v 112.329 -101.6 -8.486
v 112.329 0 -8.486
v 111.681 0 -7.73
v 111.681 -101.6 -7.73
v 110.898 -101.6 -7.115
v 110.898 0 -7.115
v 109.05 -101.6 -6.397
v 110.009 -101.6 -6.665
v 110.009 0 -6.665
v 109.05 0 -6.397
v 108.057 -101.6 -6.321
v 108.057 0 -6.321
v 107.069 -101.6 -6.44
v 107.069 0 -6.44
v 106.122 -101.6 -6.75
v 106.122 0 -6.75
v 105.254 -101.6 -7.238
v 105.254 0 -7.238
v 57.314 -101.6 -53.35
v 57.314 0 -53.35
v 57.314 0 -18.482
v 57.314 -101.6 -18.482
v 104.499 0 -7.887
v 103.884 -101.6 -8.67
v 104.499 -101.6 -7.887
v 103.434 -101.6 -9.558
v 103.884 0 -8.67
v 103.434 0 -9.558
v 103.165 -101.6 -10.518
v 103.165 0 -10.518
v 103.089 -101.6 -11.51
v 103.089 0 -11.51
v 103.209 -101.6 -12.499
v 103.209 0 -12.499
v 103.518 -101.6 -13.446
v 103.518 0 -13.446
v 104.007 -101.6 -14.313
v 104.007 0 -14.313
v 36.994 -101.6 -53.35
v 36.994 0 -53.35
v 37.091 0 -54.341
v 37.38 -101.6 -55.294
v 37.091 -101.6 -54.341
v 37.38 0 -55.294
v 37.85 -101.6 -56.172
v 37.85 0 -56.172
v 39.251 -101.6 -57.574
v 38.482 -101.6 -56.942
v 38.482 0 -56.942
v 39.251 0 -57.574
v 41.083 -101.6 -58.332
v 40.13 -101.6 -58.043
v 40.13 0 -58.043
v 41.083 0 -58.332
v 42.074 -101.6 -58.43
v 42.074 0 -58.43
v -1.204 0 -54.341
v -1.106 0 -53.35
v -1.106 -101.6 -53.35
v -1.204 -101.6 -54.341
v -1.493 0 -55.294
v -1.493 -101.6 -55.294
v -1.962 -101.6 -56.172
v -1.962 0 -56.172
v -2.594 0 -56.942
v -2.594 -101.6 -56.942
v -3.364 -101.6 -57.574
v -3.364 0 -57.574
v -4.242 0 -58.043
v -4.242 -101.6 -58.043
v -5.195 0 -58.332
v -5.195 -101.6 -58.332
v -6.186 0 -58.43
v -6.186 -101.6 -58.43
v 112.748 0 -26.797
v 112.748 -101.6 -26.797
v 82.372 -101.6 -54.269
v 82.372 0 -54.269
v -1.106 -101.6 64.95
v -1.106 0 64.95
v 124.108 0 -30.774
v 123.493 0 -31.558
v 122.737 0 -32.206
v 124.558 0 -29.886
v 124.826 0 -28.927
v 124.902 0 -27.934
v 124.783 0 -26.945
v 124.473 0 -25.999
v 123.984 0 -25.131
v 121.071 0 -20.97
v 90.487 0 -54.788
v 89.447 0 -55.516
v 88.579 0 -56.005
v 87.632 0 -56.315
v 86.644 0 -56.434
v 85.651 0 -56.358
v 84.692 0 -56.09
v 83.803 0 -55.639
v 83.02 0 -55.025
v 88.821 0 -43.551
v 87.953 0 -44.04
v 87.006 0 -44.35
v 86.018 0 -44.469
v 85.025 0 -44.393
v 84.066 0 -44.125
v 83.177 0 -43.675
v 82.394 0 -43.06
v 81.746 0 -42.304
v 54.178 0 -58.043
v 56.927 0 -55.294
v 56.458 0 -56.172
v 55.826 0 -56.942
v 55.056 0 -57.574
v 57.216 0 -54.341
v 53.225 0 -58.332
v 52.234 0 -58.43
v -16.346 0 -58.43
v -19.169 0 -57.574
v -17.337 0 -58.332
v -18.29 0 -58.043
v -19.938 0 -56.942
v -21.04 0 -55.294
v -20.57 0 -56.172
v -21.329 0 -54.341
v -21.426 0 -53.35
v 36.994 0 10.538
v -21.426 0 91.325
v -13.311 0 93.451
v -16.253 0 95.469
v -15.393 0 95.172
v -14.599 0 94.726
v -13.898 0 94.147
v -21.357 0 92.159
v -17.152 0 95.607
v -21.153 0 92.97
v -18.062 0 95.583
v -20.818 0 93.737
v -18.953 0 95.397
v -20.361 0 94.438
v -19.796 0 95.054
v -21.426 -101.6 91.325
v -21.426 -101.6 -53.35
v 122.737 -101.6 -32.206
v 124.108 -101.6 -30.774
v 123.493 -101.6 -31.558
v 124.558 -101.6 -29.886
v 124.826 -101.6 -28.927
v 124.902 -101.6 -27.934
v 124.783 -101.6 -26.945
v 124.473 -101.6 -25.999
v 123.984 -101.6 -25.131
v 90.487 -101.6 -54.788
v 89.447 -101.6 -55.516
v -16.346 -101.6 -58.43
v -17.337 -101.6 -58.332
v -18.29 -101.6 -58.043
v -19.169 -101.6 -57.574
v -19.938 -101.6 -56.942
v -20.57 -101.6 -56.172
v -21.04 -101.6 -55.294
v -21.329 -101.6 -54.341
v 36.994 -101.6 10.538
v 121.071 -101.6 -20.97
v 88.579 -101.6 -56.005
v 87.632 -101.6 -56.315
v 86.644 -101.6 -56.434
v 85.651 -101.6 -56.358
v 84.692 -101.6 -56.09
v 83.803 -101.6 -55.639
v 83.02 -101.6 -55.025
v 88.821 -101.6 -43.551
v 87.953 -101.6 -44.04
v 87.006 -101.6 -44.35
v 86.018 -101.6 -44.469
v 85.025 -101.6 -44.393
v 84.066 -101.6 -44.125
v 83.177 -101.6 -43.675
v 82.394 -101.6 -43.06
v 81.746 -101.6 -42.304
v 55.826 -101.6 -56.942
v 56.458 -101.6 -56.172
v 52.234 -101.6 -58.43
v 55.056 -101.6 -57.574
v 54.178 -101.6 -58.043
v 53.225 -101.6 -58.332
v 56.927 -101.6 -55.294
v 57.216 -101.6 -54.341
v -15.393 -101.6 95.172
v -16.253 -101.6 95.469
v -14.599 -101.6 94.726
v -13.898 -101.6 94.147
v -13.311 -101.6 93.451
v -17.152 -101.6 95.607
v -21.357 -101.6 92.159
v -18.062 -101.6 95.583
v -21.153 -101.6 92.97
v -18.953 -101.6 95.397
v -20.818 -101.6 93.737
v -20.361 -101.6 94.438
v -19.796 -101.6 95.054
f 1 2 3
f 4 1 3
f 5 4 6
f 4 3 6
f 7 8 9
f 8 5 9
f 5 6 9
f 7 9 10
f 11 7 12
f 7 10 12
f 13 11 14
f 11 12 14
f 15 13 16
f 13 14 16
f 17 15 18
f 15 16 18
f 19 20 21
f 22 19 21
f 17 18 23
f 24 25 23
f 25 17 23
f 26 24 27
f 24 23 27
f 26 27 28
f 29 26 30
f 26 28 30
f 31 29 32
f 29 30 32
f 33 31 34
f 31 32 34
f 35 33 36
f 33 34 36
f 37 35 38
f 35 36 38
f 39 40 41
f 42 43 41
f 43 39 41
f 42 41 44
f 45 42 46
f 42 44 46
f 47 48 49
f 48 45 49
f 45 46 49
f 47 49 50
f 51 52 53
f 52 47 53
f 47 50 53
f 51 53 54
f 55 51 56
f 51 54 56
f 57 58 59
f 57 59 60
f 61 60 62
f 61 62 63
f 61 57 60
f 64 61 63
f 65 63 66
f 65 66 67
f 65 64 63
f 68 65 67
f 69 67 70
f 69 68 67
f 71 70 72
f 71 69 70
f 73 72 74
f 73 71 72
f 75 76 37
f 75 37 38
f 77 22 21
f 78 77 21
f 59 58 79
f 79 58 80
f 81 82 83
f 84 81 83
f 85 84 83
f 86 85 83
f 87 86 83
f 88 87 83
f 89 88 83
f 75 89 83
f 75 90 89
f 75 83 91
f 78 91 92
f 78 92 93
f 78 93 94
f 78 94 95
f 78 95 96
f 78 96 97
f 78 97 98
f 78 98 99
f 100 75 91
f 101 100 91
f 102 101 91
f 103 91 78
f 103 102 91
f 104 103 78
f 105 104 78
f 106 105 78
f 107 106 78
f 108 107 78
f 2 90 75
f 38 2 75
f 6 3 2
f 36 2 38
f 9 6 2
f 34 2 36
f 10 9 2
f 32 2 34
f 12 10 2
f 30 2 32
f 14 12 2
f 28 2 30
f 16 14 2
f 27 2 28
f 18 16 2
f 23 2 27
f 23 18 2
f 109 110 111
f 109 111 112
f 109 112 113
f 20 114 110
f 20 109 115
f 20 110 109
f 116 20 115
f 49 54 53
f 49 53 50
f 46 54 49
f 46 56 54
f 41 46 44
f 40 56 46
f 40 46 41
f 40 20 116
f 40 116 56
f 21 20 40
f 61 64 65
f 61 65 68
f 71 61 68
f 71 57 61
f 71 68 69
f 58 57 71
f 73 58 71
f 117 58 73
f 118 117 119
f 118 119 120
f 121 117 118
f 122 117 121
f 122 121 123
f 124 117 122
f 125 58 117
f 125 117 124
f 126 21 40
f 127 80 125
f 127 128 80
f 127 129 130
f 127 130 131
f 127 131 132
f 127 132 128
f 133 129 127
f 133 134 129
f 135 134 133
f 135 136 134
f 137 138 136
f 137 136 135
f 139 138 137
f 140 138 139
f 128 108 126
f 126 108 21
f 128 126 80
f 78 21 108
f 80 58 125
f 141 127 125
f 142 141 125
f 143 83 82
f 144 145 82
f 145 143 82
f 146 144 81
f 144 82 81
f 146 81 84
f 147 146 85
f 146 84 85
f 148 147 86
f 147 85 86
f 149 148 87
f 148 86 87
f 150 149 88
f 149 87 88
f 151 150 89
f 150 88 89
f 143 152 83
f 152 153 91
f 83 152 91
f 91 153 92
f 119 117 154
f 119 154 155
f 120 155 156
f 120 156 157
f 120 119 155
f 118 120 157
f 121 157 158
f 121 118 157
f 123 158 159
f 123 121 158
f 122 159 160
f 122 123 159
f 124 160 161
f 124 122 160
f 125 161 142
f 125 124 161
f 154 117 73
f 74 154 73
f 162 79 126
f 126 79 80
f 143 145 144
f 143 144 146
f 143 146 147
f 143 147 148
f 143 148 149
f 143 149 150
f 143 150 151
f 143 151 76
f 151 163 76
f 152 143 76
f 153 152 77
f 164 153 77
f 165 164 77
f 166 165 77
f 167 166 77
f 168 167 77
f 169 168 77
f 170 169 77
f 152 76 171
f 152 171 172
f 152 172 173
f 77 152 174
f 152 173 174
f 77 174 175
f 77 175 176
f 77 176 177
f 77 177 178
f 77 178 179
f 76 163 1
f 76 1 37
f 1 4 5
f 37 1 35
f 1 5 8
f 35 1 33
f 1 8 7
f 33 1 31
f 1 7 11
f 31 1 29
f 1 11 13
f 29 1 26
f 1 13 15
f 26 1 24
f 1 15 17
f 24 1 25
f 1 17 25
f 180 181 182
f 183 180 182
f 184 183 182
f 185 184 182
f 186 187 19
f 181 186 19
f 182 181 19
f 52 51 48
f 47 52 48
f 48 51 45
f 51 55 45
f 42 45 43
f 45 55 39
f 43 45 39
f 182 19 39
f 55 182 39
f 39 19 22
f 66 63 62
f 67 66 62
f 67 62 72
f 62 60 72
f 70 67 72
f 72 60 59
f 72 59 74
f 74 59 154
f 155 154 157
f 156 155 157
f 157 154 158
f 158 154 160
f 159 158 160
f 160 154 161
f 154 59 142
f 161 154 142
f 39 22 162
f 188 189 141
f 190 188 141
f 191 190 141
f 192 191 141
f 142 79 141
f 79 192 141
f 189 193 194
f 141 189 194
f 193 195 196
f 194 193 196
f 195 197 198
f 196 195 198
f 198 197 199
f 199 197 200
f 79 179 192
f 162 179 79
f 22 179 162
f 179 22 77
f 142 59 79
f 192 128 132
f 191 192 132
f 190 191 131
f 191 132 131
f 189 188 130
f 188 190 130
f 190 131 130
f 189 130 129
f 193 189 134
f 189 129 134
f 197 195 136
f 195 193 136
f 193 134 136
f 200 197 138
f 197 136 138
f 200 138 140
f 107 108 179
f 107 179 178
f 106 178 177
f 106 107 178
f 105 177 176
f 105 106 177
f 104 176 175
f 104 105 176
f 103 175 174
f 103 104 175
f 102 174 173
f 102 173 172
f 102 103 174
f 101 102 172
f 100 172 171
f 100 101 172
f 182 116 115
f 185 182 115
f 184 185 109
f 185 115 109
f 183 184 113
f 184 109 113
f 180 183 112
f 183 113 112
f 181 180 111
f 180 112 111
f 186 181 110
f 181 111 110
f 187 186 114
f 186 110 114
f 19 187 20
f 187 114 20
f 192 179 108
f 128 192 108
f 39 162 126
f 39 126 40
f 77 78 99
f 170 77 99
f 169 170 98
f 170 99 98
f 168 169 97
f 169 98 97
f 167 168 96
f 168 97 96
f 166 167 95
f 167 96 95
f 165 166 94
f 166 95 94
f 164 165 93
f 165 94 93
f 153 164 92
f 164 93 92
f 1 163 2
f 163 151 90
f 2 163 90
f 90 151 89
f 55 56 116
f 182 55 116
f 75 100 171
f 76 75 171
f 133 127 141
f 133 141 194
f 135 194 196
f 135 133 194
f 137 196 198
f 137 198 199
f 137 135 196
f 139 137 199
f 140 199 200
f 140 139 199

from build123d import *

# Parameters (mm, degrees)
F1_DEPTH    = 101.6
F3_DEPTH    = 6.35
F5_DEPTH    = 44.45
F6_W        = 10.16
F6_H        = 101.6
F7_DEPTH    = 20.32
F8_T1_DEPTH = 101.6
F8_T3_DEPTH = 127
F8_T5_DEPTH = 114.822403084
F10_W       = 251.0453239083
F10_H       = 203.9344906807
F11_DEPTH   = 160.782


# Not quite as in the source:
# - a fillet or chamfer that OpenCascade refuses, or shapes differently, is made with other operations: its cross-section is extruded or revolved along the edge and cut away or added


with BuildPart() as f1:
    # F0 (on Front) → F1 (new body)
    with BuildSketch(Plane.XZ):
        Polygon((57.3137016242, -18.4824153282), (36.9937016242, 10.5375521688), (36.9937016242, -58.4300412773), (57.3137016242, -58.4300412773), align=None)
    extrude(amount=F1_DEPTH)



with BuildPart() as f1b:
    # F0 (on Front) → F1, piece 2 (new body)
    with BuildSketch(Plane.XZ):
        Polygon((-1.1062983758, 64.9499912257), (-21.4262983758, 93.9699587227), (-21.4262983758, -58.4300412773), (-1.1062983758, -58.4300412773), align=None)
    extrude(amount=F1_DEPTH)


with BuildPart() as f1_1:
    add(f1.part)

    add(f1b.part)  # F3 merges F1b
    # F2 (on face) → F3 (join)
    with BuildSketch(Plane(origin=(29.774176385, 0, 20.8481027487), x_dir=(0, 1, 0), z_dir=(0.8191520443, 0, 0.5735764364))):
        Polygon((-101.6, 89.265303656), (-101.6, -96.780755544), (0, -96.780755544), (0, 38.465303656), (0, 89.265303656), align=None)
    extrude(amount=F3_DEPTH)

    # F4 (on face) → F5 (join)
    with BuildSketch(Plane(origin=(34.9757918662, 0, 24.4903131196), x_dir=(0, 1, 0), z_dir=(0.8191520443, 0, 0.5735764364))):
        Polygon((-101.6, -86.620755544), (-101.6, -96.780755544), (0, -96.780755544), (0, -86.620755544), (-12.7, -86.620755544), (-88.9, -86.620755544), align=None)
    extrude(amount=F5_DEPTH)

    # F6 (on face) → F7 (join)
    with BuildSketch(Plane(origin=(49.6836242789, 0, -70.9555689817), x_dir=(0.8191520443, 0, 0.5735764364), z_dir=(-0.5735764364, 0, 0.8191520443))):
        with Locations((82.0675579321, -50.8)):
            Rectangle(F6_W, F6_H)
    extrude(amount=F7_DEPTH)

    # F8: fillet of radius 5.08 on 11 edges, made by hand

    # F8_s2 → F8_t1 (join)
    with BuildSketch(Plane.XZ):
        with BuildLine():
            ThreePointArc((81.7456478485, -42.3039634771), (85.0248074909, -44.3930185658), (88.8207085301, -43.5514875655))
            Line((88.8207085301, -43.5514875655), (84.6594161452, -46.4652558621))
            Line((84.6594161452, -46.4652558621), (81.7456478485, -42.3039634771))
        make_face()
    extrude(amount=F8_T1_DEPTH)

    # F8_s4 → F8_t3 (cut)
    with BuildSketch(Plane.XZ.offset(-12.7)):
        with BuildLine():
            ThreePointArc((112.3294196238, -8.4859061114), (109.0502599814, -6.3968510227), (105.2543589422, -7.238382023))
            Line((105.2543589422, -7.238382023), (109.4156513272, -4.3246137264))
            Line((109.4156513272, -4.3246137264), (112.3294196238, -8.4859061114))
        make_face()
        with BuildLine():
            ThreePointArc((122.7369687221, -32.206136333), (124.8260238108, -28.9269766905), (123.9844928105, -25.1310756513))
            Line((123.9844928105, -25.1310756513), (126.8982611071, -29.2923680363))
            Line((126.8982611071, -29.2923680363), (122.7369687221, -32.206136333))
        make_face()
        with BuildLine():
            ThreePointArc((105.2543589422, -7.238382023), (103.1653038535, -10.5175416655), (104.0068348538, -14.3134427047))
            Line((104.0068348538, -14.3134427047), (101.0930665572, -10.1521503197))
            Line((101.0930665572, -10.1521503197), (105.2543589422, -7.238382023))
        make_face()
        with BuildLine():
            ThreePointArc((-13.3109145979, 93.4508767085), (-16.5900742404, 95.5399317971), (-20.3859752796, 94.6984007968))
            Line((-20.3859752796, 94.6984007968), (-16.2246828946, 97.6121690935))
            Line((-16.2246828946, 97.6121690935), (-13.3109145979, 93.4508767085))
        make_face()
        with BuildLine():
            ThreePointArc((82.3715689606, -54.2687586179), (85.650728603, -56.3578137066), (89.4466296422, -55.5162827063))
            Line((89.4466296422, -55.5162827063), (85.2853372573, -58.4300510029))
            Line((85.2853372573, -58.4300510029), (82.3715689606, -54.2687586179))
        make_face()
        with BuildLine():
            ThreePointArc((-16.3462983758, -58.4300412773), (-19.9384008243, -56.9421437258), (-21.4262983758, -53.3500412773))
            Line((-21.4262983758, -53.3500412773), (-21.4262983758, -58.4300412773))
            Line((-21.4262983758, -58.4300412773), (-16.3462983758, -58.4300412773))
        make_face()
        with BuildLine():
            ThreePointArc((-1.1062983758, -53.3500412773), (-2.5941959274, -56.9421437258), (-6.1862983758, -58.4300412773))
            Line((-6.1862983758, -58.4300412773), (-1.1062983758, -58.4300412773))
            Line((-1.1062983758, -58.4300412773), (-1.1062983758, -53.3500412773))
        make_face()
        with BuildLine():
            ThreePointArc((36.9937016242, -53.3500412773), (38.4815991757, -56.9421437258), (42.0737016242, -58.4300412773))
            Line((42.0737016242, -58.4300412773), (36.9937016242, -58.4300412773))
            Line((36.9937016242, -58.4300412773), (36.9937016242, -53.3500412773))
        make_face()
        with BuildLine():
            ThreePointArc((52.2337016242, -58.4300412773), (55.8258040726, -56.9421437258), (57.3137016242, -53.3500412773))
            Line((57.3137016242, -53.3500412773), (57.3137016242, -58.4300412773))
            Line((57.3137016242, -58.4300412773), (52.2337016242, -58.4300412773))
        make_face()
    extrude(amount=F8_T3_DEPTH, mode=Mode.SUBTRACT)

    # F8_s6 → F8_t5 (cut)
    with BuildSketch(Plane.XZ.offset(-6.611201542)):
        with BuildLine():
            ThreePointArc((-21.4262983758, 91.3254781059), (-20.8523134084, 93.6711610611), (-19.2600666725, 95.4867704908))
            Line((-19.2600666725, 95.4867704908), (-21.4262983758, 93.9699587227))
            Line((-21.4262983758, 93.9699587227), (-21.4262983758, 91.3254781059))
        make_face()
    extrude(amount=F8_T5_DEPTH, mode=Mode.SUBTRACT)


with BuildPart() as f9_1:
    # F9: copy of F1
    add(f1_1.part.moved(Location((0, 169.418, 0))))

    # F10 (on face) → F11 (cut)
    with BuildSketch(Plane.XZ.offset(-67.818)):
        with Locations((60.7606135309, 16.4267346263)):
            Rectangle(F10_W, F10_H)
    extrude(amount=-F11_DEPTH, mode=Mode.SUBTRACT)


solid = f1_1.part
